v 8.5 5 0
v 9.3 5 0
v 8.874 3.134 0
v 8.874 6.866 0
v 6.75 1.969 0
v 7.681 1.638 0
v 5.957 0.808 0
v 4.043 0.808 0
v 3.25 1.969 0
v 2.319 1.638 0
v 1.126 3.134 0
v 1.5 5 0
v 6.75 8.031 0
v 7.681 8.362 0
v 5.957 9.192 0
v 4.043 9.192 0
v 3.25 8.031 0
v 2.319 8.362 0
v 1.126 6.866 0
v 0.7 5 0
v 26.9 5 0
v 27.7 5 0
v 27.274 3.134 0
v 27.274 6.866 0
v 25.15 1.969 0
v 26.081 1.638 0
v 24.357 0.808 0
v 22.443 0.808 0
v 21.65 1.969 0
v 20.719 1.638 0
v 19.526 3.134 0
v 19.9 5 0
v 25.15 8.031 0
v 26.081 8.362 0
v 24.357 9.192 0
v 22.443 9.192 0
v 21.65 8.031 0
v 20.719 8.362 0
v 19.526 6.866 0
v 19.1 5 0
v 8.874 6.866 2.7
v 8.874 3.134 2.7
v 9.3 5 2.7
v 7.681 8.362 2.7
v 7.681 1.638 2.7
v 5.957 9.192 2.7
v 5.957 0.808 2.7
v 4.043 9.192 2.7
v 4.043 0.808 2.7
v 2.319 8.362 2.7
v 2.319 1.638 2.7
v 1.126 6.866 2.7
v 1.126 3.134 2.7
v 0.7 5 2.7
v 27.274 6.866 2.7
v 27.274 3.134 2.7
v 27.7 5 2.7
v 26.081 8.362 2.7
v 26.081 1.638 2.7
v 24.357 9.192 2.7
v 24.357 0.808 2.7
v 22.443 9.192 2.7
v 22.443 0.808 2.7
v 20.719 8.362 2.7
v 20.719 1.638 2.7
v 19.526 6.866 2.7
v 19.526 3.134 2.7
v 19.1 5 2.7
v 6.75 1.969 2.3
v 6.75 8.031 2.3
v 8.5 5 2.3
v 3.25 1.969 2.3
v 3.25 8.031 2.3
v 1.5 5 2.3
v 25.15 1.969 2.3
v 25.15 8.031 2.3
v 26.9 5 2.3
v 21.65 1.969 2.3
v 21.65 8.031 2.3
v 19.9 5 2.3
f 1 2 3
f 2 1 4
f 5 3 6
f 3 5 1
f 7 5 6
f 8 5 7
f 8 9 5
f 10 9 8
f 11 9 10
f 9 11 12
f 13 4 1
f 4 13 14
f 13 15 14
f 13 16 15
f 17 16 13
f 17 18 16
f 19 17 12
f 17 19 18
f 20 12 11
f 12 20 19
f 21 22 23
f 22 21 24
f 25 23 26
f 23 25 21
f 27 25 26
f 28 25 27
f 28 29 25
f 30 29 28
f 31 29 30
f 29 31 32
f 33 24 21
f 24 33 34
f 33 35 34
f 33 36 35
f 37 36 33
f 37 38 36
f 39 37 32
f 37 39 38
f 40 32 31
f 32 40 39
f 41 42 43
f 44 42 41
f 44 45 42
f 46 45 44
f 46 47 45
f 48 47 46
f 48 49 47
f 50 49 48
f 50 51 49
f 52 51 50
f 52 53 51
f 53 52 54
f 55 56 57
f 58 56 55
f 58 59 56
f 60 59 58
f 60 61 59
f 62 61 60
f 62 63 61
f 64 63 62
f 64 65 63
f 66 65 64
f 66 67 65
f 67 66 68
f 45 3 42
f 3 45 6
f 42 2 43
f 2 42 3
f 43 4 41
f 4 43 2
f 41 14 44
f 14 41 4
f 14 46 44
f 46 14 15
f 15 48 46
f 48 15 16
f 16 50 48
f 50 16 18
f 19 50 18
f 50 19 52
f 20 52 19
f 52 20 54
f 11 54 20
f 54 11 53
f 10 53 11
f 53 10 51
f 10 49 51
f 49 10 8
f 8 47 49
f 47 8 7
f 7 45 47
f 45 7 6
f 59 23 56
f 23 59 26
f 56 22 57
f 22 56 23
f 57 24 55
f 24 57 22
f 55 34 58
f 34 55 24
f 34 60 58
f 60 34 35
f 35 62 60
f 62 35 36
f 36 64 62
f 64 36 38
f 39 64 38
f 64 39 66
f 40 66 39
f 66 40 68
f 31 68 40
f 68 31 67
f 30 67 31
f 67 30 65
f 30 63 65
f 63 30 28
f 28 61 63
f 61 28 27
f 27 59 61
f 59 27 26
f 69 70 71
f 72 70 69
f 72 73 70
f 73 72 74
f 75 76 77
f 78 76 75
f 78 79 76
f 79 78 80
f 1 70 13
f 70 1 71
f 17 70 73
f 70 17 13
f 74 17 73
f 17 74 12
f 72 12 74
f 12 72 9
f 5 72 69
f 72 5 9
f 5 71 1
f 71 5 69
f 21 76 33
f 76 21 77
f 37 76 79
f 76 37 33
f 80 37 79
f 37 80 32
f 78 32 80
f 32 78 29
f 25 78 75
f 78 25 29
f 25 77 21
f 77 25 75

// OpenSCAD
// Copyright (C) 2025 Arif K. Rafiq
// This program is free software: you can redistribute it and/or modify
// it under the terms of the GNU General Public License as published by
// the Free Software Foundation, either version 3 of the License, or
// (at your option) any later version.

// This program is distributed in the hope that it will be useful,
// but WITHOUT ANY WARRANTY; without even the implied warranty of
// MERCHANTABILITY or FITNESS FOR A PARTICULAR PURPOSE.  See the
// GNU General Public License for more details.

// You should have received a copy of the GNU General Public License
// along with this file.  If not, see <https://www.gnu.org/licenses/>,
// or write to: license@temperedoptimism.com


// NOTHING SHOWS
// Fixed in example3.scad

tWallMin = 0.40;         // Limit for 3D printer, I have 0.2
pHexSink = [3.5, 2.3];
vTerminal0 = [5.0, 5.0];
vTerminal1 = [23.4, 5.0];
fx0=2;    //convexity
tEps=0.01; // Fixing conflicting bodies


difference(){
  // hex pocket surround
  // Read about render(convexity)                           
  linear_extrude(pHexSink.y+ tWallMin, convexity=fx0){  
    translate(vTerminal0)  circle(pHexSink.x +(tWallMin *2));
    translate(vTerminal1)  circle(pHexSink.x +(tWallMin *2));
  }
  //hex pocket
  // Solve Conflicting bodies
  translate([0,0, -tEps]) linear_extrude(pHexSink.y + tEps, convexity=fx0){
      translate(vTerminal0)  circle(pHexSink.x, $fn=6);
      translate(vTerminal1)  circle(pHexSink.x, $fn=6);
  }

}
